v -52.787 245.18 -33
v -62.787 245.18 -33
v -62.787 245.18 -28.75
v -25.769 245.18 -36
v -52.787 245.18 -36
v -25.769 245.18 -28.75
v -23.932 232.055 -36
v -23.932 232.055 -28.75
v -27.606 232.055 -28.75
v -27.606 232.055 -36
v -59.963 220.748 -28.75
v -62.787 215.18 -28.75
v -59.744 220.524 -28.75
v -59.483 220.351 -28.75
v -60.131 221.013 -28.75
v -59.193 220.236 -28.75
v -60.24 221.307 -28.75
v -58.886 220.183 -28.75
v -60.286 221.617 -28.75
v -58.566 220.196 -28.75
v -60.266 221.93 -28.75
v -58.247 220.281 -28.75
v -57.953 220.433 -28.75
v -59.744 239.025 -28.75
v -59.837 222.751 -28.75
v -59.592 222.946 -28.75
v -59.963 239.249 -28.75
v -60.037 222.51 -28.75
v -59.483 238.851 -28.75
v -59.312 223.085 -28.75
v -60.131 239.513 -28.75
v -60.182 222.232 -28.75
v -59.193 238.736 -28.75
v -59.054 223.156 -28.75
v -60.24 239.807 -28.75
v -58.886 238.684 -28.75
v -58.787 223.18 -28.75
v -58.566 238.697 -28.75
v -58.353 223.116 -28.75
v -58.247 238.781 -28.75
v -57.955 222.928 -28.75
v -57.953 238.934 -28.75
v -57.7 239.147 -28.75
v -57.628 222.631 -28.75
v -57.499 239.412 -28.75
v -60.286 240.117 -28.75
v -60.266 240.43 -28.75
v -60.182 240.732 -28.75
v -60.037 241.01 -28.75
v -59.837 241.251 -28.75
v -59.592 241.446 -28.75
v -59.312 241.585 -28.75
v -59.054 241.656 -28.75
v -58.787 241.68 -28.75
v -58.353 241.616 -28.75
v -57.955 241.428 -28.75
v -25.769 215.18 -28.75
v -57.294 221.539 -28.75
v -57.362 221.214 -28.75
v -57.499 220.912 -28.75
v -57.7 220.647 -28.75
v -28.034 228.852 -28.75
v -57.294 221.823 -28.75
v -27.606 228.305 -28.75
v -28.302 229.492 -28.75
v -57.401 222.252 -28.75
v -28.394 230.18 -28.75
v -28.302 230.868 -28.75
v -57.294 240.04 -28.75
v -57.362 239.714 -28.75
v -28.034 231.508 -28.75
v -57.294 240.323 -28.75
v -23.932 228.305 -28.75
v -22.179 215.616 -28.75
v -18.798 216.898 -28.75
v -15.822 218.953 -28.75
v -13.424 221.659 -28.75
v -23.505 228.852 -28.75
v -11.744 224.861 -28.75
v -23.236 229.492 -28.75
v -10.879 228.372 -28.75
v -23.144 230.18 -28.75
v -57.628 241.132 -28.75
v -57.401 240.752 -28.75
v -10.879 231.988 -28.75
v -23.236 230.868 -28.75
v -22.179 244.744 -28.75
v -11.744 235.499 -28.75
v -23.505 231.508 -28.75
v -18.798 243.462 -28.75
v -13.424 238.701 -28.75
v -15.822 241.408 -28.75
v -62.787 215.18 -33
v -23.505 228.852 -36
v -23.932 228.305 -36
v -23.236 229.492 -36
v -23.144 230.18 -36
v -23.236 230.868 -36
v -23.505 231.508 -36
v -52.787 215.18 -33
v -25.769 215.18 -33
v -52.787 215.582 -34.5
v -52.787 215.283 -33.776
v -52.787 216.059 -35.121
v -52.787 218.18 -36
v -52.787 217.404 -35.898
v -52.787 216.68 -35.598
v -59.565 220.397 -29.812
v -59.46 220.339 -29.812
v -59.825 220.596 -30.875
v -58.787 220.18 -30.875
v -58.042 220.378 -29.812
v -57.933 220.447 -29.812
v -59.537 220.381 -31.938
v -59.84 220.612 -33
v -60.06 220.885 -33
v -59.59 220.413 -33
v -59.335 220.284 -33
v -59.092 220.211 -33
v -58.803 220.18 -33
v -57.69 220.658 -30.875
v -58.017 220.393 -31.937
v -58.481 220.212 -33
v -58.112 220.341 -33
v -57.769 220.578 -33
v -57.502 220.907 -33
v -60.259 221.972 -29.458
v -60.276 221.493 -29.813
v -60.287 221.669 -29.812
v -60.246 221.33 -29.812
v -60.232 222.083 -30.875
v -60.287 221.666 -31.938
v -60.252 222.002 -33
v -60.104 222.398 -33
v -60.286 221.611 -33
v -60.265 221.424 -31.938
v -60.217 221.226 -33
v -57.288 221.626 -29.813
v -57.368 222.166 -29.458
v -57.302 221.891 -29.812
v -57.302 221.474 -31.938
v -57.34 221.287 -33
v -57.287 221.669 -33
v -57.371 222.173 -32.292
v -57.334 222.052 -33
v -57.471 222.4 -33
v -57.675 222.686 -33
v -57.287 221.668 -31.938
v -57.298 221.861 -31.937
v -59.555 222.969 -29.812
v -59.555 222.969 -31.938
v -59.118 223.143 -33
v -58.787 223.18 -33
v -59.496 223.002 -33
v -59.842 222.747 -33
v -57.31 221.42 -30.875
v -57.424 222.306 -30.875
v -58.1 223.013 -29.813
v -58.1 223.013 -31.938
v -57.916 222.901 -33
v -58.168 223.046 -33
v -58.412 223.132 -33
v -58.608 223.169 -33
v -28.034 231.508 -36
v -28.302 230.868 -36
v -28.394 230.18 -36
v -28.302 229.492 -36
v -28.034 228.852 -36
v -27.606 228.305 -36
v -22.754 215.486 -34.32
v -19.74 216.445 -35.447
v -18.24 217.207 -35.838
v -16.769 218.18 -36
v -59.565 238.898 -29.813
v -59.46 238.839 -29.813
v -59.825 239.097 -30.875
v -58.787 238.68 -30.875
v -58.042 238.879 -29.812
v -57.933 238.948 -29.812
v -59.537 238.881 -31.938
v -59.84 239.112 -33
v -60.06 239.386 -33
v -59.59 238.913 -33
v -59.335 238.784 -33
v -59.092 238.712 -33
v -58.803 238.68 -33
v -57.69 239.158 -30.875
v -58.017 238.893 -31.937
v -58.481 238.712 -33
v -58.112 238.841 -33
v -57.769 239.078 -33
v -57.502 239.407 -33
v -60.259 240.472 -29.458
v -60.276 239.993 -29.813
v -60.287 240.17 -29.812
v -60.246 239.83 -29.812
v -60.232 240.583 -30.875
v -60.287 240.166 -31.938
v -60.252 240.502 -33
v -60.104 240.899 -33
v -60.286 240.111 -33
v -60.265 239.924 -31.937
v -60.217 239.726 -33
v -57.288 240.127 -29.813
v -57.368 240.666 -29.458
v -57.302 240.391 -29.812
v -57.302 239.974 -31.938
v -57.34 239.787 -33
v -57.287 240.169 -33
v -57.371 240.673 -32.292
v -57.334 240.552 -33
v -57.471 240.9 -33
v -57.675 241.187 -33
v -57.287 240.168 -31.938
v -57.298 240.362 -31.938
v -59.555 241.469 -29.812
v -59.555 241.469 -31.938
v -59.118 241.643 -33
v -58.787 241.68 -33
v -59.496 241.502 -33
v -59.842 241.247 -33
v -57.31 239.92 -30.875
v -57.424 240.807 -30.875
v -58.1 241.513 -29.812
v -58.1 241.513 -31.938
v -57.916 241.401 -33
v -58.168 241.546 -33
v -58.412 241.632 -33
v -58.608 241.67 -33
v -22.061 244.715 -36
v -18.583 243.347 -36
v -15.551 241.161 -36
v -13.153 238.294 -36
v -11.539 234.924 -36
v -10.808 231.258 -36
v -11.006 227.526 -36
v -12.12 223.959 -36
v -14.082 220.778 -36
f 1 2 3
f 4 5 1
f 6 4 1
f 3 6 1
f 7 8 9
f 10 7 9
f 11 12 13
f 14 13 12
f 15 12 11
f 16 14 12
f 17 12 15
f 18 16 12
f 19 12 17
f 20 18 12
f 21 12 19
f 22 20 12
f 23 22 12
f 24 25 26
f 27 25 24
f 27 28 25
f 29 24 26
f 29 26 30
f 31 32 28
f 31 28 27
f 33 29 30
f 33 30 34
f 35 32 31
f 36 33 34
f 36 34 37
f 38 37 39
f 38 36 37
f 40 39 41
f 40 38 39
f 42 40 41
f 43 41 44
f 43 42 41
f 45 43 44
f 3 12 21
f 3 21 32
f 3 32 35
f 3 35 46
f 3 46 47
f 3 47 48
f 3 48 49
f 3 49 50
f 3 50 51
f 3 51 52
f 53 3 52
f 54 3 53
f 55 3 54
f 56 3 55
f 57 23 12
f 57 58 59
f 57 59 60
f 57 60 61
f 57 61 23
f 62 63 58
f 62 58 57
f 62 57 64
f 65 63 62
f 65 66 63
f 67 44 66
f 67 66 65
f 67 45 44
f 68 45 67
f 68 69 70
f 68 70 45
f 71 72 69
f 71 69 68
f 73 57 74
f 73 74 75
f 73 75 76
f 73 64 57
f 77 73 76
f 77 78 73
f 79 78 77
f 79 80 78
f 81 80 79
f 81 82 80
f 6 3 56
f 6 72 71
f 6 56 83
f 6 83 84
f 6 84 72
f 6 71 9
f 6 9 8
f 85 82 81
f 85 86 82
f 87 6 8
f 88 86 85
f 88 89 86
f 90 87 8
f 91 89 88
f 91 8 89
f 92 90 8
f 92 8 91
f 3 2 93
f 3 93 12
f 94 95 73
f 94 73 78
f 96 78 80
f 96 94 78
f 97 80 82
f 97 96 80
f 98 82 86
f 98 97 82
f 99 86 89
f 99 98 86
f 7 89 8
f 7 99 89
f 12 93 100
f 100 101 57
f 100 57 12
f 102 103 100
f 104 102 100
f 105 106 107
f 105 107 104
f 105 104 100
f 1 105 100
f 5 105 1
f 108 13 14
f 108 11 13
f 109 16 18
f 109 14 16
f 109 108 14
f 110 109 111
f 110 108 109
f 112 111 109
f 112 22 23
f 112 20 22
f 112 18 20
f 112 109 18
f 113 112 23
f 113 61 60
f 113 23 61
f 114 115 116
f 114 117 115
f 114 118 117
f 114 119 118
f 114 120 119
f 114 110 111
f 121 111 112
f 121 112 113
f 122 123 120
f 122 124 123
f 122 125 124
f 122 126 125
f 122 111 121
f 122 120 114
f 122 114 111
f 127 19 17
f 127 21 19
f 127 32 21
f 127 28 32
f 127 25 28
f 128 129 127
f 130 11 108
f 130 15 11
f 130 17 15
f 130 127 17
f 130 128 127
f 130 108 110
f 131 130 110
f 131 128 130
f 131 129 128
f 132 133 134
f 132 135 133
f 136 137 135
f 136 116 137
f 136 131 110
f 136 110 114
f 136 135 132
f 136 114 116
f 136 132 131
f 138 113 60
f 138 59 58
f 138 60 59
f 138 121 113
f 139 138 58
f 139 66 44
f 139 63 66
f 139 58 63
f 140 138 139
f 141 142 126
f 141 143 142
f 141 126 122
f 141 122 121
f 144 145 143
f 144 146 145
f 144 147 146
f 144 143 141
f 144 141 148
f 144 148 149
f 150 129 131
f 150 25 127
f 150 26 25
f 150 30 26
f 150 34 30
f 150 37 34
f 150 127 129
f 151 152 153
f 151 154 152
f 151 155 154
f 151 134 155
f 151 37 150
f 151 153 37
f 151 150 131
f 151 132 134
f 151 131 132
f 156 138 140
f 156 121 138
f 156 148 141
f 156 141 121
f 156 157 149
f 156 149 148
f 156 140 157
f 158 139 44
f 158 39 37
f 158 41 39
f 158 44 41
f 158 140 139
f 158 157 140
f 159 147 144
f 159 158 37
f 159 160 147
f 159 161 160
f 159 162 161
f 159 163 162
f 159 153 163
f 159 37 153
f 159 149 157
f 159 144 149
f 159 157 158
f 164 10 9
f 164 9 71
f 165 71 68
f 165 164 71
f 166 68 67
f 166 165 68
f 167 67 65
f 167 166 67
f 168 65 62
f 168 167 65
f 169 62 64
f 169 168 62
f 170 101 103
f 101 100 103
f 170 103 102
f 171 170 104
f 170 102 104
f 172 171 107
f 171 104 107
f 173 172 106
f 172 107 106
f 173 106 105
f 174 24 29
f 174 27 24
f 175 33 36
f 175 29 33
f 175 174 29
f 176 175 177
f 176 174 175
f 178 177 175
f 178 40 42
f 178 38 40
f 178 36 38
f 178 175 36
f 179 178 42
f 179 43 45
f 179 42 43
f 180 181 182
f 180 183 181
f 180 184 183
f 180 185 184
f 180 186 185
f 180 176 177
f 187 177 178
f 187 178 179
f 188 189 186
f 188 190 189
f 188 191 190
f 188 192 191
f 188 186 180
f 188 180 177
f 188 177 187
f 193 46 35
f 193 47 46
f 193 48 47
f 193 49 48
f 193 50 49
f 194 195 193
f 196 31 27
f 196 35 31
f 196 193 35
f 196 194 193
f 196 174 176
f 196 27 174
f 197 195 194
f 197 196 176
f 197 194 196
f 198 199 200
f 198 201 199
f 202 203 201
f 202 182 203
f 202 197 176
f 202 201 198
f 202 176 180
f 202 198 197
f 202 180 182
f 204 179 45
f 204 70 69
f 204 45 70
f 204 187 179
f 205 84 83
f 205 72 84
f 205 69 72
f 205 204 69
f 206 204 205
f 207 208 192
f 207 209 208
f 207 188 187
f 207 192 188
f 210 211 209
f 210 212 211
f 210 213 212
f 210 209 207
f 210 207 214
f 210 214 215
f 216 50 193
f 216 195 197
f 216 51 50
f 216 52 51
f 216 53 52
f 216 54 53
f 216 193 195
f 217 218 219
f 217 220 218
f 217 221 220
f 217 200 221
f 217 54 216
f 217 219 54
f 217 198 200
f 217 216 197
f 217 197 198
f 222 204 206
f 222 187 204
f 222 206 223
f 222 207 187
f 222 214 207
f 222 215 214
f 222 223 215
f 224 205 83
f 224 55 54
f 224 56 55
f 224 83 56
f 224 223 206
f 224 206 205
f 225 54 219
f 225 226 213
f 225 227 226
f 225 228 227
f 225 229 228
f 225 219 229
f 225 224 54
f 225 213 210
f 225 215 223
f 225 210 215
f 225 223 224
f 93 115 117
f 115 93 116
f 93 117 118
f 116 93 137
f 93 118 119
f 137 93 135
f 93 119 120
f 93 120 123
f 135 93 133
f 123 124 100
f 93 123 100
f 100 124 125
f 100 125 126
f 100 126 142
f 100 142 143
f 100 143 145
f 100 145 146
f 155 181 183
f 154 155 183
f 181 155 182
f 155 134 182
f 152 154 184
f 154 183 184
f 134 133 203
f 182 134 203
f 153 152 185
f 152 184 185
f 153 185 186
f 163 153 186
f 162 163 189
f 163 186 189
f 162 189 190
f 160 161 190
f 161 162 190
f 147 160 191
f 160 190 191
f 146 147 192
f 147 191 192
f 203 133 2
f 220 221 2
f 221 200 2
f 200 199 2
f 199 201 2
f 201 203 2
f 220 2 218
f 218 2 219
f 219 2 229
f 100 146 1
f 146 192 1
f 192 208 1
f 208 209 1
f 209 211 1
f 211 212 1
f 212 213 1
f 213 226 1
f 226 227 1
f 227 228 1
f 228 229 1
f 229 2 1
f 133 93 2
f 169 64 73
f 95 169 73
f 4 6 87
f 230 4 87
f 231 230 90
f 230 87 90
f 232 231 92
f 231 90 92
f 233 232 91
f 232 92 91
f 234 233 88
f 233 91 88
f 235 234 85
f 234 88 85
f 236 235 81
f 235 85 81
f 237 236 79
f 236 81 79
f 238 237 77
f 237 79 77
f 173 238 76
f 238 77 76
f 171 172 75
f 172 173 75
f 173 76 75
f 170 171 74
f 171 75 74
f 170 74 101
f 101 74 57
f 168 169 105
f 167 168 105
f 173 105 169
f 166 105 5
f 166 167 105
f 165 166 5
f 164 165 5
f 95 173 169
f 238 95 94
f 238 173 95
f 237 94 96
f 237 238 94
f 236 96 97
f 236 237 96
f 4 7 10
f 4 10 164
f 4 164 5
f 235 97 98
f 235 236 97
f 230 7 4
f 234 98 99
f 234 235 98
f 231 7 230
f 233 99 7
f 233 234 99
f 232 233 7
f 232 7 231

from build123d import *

# Parameters (mm, degrees)
BOSS_EXTRUDE1_DEPTH     = 8
BOSS_EXTRUDE2_DEPTH     = 8
SKETCH4_W               = 36.000000000000064
SKETCH4_H               = 30.000000000000057
BOSS_EXTRUDE3_DEPTH     = 8
SKETCH5_R               = 7.000000000000002
SKETCH5_R_2             = 5.000000000000002
BOSS_EXTRUDE4_DEPTH     = 10
CHAMFER1_SIZE           = 3
CUT_EXTRUDE1_REACH      = 260.278
CUT_EXTRUDE2_DEPTH      = 254.2099380250209
SKETCH8_W               = 17.000000000000007
SKETCH8_H               = 20.000000000000043
BOSS_EXTRUDE5_DEPTH     = 7
CUT_EXTRUDE3_DEPTH      = 0.75
CUT_EXTRUDE4_DEPTH      = 0.75
CUT_EXTRUDE5_DEPTH      = 254.2099381566107
CUT_EXTRUDE5_DEPTH_BACK = 254.2099381566107
CUT_EXTRUDE6_DEPTH      = 3
SKETCH14_W              = 9.999999998633207
SKETCH14_H              = 30.000000000000057
CUT_EXTRUDE7_DEPTH      = 3
CUT_EXTRUDE8_START      = -33
CUT_EXTRUDE8_DEPTH      = 30
SKETCH16_W              = 67.2347482813901
SKETCH16_H              = 36.897117956044724
CUT_EXTRUDE9_DEPTH      = 28.75


with BuildPart() as part:
    # Sketch2 → Boss-Extrude1 (new body)
    with BuildSketch(Plane.XY.offset(-8.000000000000261)):
        with BuildLine():
            Line((-25.76918534335193, 245.18029985394168), (-54.787386755608914, 245.18029985394168))
            Line((-54.787386755608914, 245.18029985394168), (-54.787386755608914, 215.18029985394165))
            Line((-54.787386755608914, 215.18029985394165), (-25.76918534335193, 215.18029985394165))
            ThreePointArc((-25.76918534335193, 215.18029985394165), (-10.7691853433519, 230.18029985394168), (-25.76918534335193, 245.18029985394168))
        make_face()
    extrude(amount=BOSS_EXTRUDE1_DEPTH)



with BuildPart() as body_2:
    # Sketch3 → Boss-Extrude2 (new body)
    with BuildSketch(Plane(origin=(4.616e-14, 1.89e-15, -28.000000000000256), x_dir=(-1, 0, -1.65e-15), z_dir=(1.65e-15, 7e-17, -1))):
        with BuildLine():
            Line((25.769185343351936, 215.18029985394165), (54.78738675560893, 215.18029985394165))
            Line((54.78738675560893, 215.18029985394165), (54.78738675560893, 245.18029985394168))
            Line((54.78738675560893, 245.18029985394168), (25.76918534335194, 245.18029985394168))
            ThreePointArc((25.76918534335194, 245.18029985394168), (10.769185343351939, 230.18029985394168), (25.769185343351936, 215.18029985394165))
        make_face()
    extrude(amount=BOSS_EXTRUDE2_DEPTH)


with BuildPart() as part_1:
    add(part.part)

    add(body_2.part)  # Boss-Extrude3 merges body 2
    # Sketch4 → Boss-Extrude3 (add)
    with BuildSketch(Plane.ZY.offset(54.787386755608914)):
        with Locations((-18.000000000000345, 230.18029985394168)):
            Rectangle(SKETCH4_W, SKETCH4_H)
    extrude(amount=BOSS_EXTRUDE3_DEPTH)

    # Sketch5 → Boss-Extrude4 (add)
    with BuildSketch(Plane.ZY.offset(62.78738675560891)):
        with Locations((-18.00000000000032, 230.18029985394168)):
            Circle(SKETCH5_R)
        with Locations((-18.00000000000032, 230.18029985394168)):
            Circle(SKETCH5_R_2, mode=Mode.SUBTRACT)
    extrude(amount=BOSS_EXTRUDE4_DEPTH)

    # Chamfer1
    chamfer1_edges = [part_1.edges().sort_by_distance(p)[0] for p in [
        (-62.78738675560891, 230.18029985394168, -25.00000000000032),
    ]]
    chamfer(chamfer1_edges, length=CHAMFER1_SIZE)

    # Cut-Extrude1: up to this face of the body (flat: up to its plane)
    cut_extrude1_end = Plane(part_1.part.faces().sort_by_distance((-38.272954764, 230.180299854, 0))[0])
    # Sketch6 → Cut-Extrude1 (cut, up to the picked face)
    with BuildSketch(Plane(origin=(0, 0, -36.00000000000038), x_dir=(-1, 0, 0), z_dir=(0, 0, -1)), mode=Mode.PRIVATE) as cut_extrude1_sk1:
        with BuildLine():
            Line((23.93206803626449, 232.05529985394165), (27.606302650439275, 232.05529985394165))
            ThreePointArc((27.606302650439275, 232.05529985394165), (28.39418534335189, 230.18029985394165), (27.606302650439247, 228.30529985394165))
            Line((27.606302650439247, 228.30529985394165), (23.932068036264518, 228.30529985394165))
            ThreePointArc((23.932068036264518, 228.30529985394165), (23.144185343351896, 230.18029985394165), (23.93206803626449, 232.05529985394165))
        make_face()
    cut_extrude1_tool1 = split(extrude(cut_extrude1_sk1.sketch, amount=-CUT_EXTRUDE1_REACH, mode=Mode.PRIVATE), bisect_by=cut_extrude1_end, keep=Keep.BOTH, mode=Mode.PRIVATE)
    add(cut_extrude1_tool1.solids().sort_by(Axis((-25.769185, 230.1803, -36), (0, 0, 1)))[0], mode=Mode.SUBTRACT)

    # Sketch7 → Cut-Extrude2 (cut, through all)
    with BuildSketch(Plane.ZY.offset(62.78738675560891)):
        with BuildLine():
            Line((-3.1052e-13, 215.18029985394165), (-3.1052e-13, 218.18029985394165))
            ThreePointArc((-3.1052e-13, 218.18029985394165), (-0.878679656440668, 216.05897951038202), (-3.0000000000003104, 215.18029985394165))
            Line((-3.0000000000003104, 215.18029985394165), (-3.1052e-13, 215.18029985394165))
        make_face()
        with BuildLine():
            Line((-36.000000000000384, 215.18029985394165), (-33.00000000000038, 215.18029985394165))
            ThreePointArc((-33.00000000000038, 215.18029985394165), (-35.12132034356002, 216.058979510382), (-36.000000000000384, 218.18029985394165))
            Line((-36.000000000000384, 218.18029985394165), (-36.000000000000384, 215.18029985394165))
        make_face()
    extrude(amount=-CUT_EXTRUDE2_DEPTH, mode=Mode.SUBTRACT)

    # Sketch8 → Boss-Extrude5 (add)
    with BuildSketch(Plane.XZ.offset(-215.18029985394165)):
        with Locations((-48.28738675560892, -18.000000000000284)):
            Rectangle(SKETCH8_W, SKETCH8_H)
    extrude(amount=-BOSS_EXTRUDE5_DEPTH)

    # Sketch10 → Cut-Extrude3 (cut)
    with BuildSketch(Plane.XY.offset(-28.000000000000256)):
        with BuildLine():
            Line((-54.78738675560893, 222.18029985394168), (-39.78738675560896, 222.18029985394168))
            Line((-39.78738675560896, 222.18029985394168), (-39.78738675560896, 215.18029985394165))
            Line((-39.78738675560896, 215.18029985394165), (-25.769185343351936, 215.18029985394165))
            ThreePointArc((-25.769185343351936, 215.18029985394165), (-10.76918534335191, 230.18029985394168), (-25.76918534335194, 245.18029985394168))
            Line((-25.76918534335194, 245.18029985394168), (-54.78738675560893, 245.18029985394168))
            Line((-54.78738675560893, 245.18029985394168), (-54.78738675560893, 222.18029985394168))
        make_face()
    extrude(amount=-CUT_EXTRUDE3_DEPTH, mode=Mode.SUBTRACT)

    # Sketch11 → Cut-Extrude4 (cut)
    with BuildSketch(Plane(origin=(0, 0, -8.000000000000261), x_dir=(-1, 0, 0), z_dir=(0, 0, -1))):
        with BuildLine():
            Line((25.76918534335193, 215.18029985394165), (39.787386755608914, 215.18029985394165))
            Line((39.787386755608914, 215.18029985394165), (39.787386755608914, 222.18029985394168))
            Line((39.787386755608914, 222.18029985394168), (54.787386755608914, 222.18029985394168))
            Line((54.787386755608914, 222.18029985394168), (54.787386755608914, 245.18029985394168))
            Line((54.787386755608914, 245.18029985394168), (25.76918534335193, 245.18029985394168))
            ThreePointArc((25.76918534335193, 245.18029985394168), (10.769185343351928, 230.18029985394168), (25.76918534335193, 215.18029985394165))
        make_face()
    extrude(amount=-CUT_EXTRUDE4_DEPTH, mode=Mode.SUBTRACT)

    # Sketch12 → Cut-Extrude5 (cut, two sides: drawn at the far end of the back side and taken through both)
    with BuildSketch(Plane.ZY.offset(62.78738675560891).offset(-CUT_EXTRUDE5_DEPTH_BACK)):
        with BuildLine():
            Line((-23.750000000000245, 242.68029985394168), (-12.25000000000027, 242.68029985394168))
            ThreePointArc((-12.25000000000027, 242.68029985394168), (-11.542893218813717, 242.38740663512823), (-11.250000000000261, 241.68029985394168))
            Line((-11.250000000000261, 241.68029985394168), (-11.250000000000261, 239.18029985394168))
            ThreePointArc((-11.250000000000261, 239.18029985394168), (-11.542893218813717, 238.47319307275512), (-12.25000000000027, 238.18029985394168))
            Line((-12.25000000000027, 238.18029985394168), (-23.750000000000245, 238.18029985394168))
            ThreePointArc((-23.750000000000245, 238.18029985394168), (-24.4571067811868, 238.47319307275512), (-24.750000000000256, 239.18029985394168))
            Line((-24.750000000000256, 239.18029985394168), (-24.750000000000256, 241.68029985394168))
            ThreePointArc((-24.750000000000256, 241.68029985394168), (-24.4571067811868, 242.38740663512823), (-23.750000000000245, 242.68029985394168))
        make_face()
    extrude(amount=CUT_EXTRUDE5_DEPTH + CUT_EXTRUDE5_DEPTH_BACK, mode=Mode.SUBTRACT)

    # Sketch13 → Cut-Extrude6 (cut)
    with BuildSketch(Plane(origin=(0, 0, -36.00000000000038), x_dir=(-1, 0, 0), z_dir=(0, 0, -1))):
        Polygon((52.78738675697571, 245.1803259806636), (65.22032452313796, 245.1803259806636), (65.22032452313796, 215.18029985394165), (52.787386756975714, 215.18029985394165), align=None)
    extrude(amount=-CUT_EXTRUDE6_DEPTH, mode=Mode.SUBTRACT)

    # Sketch14 → Cut-Extrude7 (cut)
    with BuildSketch(Plane.XY):
        with Locations((-57.78738675629231, 230.18029985394168)):
            Rectangle(SKETCH14_W, SKETCH14_H)
    extrude(amount=-CUT_EXTRUDE7_DEPTH, mode=Mode.SUBTRACT)

    # Sketch15 → Cut-Extrude8 (cut)
    with BuildSketch(Plane.XY.offset(CUT_EXTRUDE8_START)):
        with BuildLine():
            add(Edge.make_bspline(
                [(-58.787343120375006, 241.68025514760154), (-61.78734312026629, 241.68025514726713), (-61.78734312015468, 238.68025514738127), (-58.7873431202634, 238.68025514771568), (-55.78734312037213, 238.6802551480501), (-55.78734312048373, 241.68025514793592), (-58.787343120375006, 241.68025514760154)],
                knots=[0, 0, 0, 0, 0.5, 0.5, 0.5, 1, 1, 1, 1], degree=3, weights=[1, 0.33333333333333337, 0.33333333333333337, 1, 0.33333333333333337, 0.33333333333333337, 1]))
        make_face()
        with BuildLine():
            add(Edge.make_bspline(
                [(-58.787343119686746, 223.17998583120436), (-61.78734311957803, 223.17998583086998), (-61.78734311946642, 220.17998583098415), (-58.787343119575134, 220.1799858313185), (-55.78734311968384, 220.1799858316529), (-55.78734311979546, 223.17998583153874), (-58.787343119686746, 223.17998583120436)],
                knots=[0, 0, 0, 0, 0.5, 0.5, 0.5, 1, 1, 1, 1], degree=3, weights=[1, 0.33333333333333337, 0.33333333333333337, 1, 0.33333333333333337, 0.33333333333333337, 1]))
        make_face()
    extrude(amount=CUT_EXTRUDE8_DEPTH, mode=Mode.SUBTRACT)

    # Sketch16 → Cut-Extrude9 (cut)
    with BuildSketch(Plane.XY):
        with Locations((-42.47434442630761, 229.60312045940518)):
            Rectangle(SKETCH16_W, SKETCH16_H)
    extrude(amount=-CUT_EXTRUDE9_DEPTH, mode=Mode.SUBTRACT)


solid = part_1.part
